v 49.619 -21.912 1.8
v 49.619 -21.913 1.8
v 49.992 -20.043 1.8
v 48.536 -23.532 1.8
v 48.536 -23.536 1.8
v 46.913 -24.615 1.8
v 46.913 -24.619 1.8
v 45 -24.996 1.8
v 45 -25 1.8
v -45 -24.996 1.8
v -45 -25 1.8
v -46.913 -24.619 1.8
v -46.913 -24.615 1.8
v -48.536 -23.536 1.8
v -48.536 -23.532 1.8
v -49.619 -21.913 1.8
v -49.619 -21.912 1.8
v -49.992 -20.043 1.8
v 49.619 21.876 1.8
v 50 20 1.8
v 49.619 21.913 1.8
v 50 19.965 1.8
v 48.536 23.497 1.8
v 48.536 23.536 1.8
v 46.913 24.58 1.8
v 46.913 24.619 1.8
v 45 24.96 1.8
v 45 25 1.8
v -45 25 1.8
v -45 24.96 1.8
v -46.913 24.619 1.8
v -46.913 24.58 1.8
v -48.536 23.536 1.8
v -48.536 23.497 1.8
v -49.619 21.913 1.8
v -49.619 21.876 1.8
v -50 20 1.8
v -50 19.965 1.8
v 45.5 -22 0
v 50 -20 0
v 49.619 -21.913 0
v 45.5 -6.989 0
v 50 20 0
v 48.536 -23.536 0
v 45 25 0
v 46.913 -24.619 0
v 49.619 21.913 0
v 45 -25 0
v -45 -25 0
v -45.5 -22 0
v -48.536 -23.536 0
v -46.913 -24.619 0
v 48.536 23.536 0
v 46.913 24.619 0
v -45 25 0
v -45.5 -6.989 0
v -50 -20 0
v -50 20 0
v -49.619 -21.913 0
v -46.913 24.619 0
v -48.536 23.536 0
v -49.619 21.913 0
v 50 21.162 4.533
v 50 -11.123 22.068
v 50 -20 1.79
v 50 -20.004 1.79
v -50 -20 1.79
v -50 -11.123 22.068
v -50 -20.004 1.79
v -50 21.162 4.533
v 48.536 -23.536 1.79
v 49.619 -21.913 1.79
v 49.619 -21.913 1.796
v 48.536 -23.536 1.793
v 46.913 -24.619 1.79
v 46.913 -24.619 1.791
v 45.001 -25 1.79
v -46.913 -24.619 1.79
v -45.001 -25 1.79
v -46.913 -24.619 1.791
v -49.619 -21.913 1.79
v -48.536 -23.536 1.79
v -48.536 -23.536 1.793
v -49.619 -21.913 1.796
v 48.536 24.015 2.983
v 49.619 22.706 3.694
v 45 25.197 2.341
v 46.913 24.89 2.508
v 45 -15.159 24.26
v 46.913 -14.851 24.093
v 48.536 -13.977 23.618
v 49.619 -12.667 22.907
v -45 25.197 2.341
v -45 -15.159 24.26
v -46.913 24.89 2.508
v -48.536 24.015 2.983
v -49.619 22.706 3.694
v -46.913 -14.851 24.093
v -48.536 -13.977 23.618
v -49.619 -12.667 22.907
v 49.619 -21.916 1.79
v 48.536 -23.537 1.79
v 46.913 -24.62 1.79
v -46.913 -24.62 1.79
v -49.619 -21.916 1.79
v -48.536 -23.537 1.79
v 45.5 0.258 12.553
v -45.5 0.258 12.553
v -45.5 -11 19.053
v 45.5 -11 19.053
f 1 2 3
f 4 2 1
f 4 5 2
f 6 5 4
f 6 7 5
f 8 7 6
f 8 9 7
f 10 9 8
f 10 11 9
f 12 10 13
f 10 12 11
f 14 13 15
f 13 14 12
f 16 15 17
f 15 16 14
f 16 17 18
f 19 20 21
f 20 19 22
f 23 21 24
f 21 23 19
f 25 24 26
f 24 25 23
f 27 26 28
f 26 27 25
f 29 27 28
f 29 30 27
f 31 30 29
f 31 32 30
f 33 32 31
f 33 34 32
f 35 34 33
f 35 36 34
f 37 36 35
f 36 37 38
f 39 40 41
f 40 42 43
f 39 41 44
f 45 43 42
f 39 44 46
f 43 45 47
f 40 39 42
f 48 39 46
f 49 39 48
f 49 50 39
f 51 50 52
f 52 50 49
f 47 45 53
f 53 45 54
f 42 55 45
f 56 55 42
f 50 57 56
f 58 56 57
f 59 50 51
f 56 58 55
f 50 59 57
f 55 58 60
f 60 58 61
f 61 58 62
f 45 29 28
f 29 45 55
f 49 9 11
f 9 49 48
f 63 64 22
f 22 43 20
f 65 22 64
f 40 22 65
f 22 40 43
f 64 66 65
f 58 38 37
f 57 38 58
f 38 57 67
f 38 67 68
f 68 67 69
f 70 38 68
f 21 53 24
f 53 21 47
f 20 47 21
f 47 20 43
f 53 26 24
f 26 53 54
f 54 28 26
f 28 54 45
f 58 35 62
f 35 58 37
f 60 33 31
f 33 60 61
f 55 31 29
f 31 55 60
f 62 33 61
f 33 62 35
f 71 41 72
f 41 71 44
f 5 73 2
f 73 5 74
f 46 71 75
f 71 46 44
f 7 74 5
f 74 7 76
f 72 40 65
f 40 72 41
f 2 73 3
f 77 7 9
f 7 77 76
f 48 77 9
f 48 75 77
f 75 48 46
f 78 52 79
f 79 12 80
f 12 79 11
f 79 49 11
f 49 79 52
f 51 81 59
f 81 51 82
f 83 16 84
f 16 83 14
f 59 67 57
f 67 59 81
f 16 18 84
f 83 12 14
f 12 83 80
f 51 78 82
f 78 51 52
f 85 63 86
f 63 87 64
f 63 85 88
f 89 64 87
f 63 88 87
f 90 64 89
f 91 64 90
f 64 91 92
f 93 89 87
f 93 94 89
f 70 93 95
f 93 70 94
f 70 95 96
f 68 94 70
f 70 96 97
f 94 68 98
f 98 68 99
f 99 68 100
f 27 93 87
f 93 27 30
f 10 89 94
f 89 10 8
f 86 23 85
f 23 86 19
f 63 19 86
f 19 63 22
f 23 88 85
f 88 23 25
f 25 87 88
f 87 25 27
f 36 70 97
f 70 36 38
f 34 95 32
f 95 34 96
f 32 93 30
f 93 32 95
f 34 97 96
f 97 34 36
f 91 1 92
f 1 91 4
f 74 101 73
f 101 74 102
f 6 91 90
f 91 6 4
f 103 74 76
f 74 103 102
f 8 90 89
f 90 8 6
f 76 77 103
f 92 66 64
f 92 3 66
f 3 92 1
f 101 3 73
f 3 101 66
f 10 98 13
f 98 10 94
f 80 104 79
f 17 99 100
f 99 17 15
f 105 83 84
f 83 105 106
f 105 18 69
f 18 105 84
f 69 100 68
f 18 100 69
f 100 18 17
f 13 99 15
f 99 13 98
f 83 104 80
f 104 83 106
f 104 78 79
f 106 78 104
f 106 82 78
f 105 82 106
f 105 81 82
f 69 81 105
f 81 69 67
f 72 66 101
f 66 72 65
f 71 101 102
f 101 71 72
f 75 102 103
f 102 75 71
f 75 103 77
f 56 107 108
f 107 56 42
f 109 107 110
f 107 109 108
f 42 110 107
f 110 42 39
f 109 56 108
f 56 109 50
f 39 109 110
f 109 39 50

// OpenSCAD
// [FL_INDEX: keywords="openscad, 3d_parametric, Customizable_Tricolor_Card_Holder, csg_solid" | COT="Parametric OpenSCAD design from 3DCodeverse"]
// Title: Customizable Tricolor Card Holder 

// preview[view:south, tilt:bottom]

/* [Color One] */

// Load a 150x40 pixel image. This is the artwork for the first colour in the logo. The background should be black and the logo white. If not, make sure to click the Invert Colors checkbox.
tone_one = "tone_one.dat"; // [image_surface:150x40]

// What Z height would you like to pause the printer to change the filament for the first logo color (mm)?
z_height_one = 0.6;

/* [Color Two] */

// Load a  150x40 pixel image. This is the artwork for the second colour in the logo. The background should be black and the logo white. If not, make sure to click the Invert Colors checkbox.
tone_two = "tone_two.dat"; // [image_surface:150x40]

// What Z height would you like to pause the printer to change the filament for the second logo color (mm)?
z_height_two = 1.2;

/* [Hidden] */

holder_x = 100;
holder_y = 50;
holder_z = 25;
card_x = 91;
card_y = 13;
card_z = 22;
corner_radius = 5;
box_x = holder_x - (corner_radius * 2);
box_y = holder_y - (corner_radius * 2);
face_z = z_height_one + z_height_two;
offset_x = (holder_x / 2) - corner_radius;
offset_y = (holder_y / 2) - corner_radius;
logo_x = 90;
logo_y = 24;
scale_x = 150;
scale_y = 40;

difference() {
	translate([0, 0, face_z]) {
		translate([0, 0, -(face_z/2)]) {
			cube([box_x, holder_y, face_z], center=true);
			cube([holder_x, box_y, face_z], center=true);
			translate([ offset_x,  offset_y, 0]) cylinder(h=face_z, r=corner_radius, center=true);
			translate([-offset_x,  offset_y, 0]) cylinder(h=face_z, r=corner_radius, center=true);
			translate([ offset_x, -offset_y, 0]) cylinder(h=face_z, r=corner_radius, center=true);
			translate([-offset_x, -offset_y, 0]) cylinder(h=face_z, r=corner_radius, center=true);
		}
		translate([0, -holder_y / 2, -0.01]) scale([1, 0.898, 1]) rotate([-26, 0, 0]) difference() {
			translate([0, holder_y / 2, holder_z/2]) {
				cube([box_x, holder_y, holder_z], center=true);
				cube([holder_x, box_y, holder_z], center=true);
				translate([ offset_x,  offset_y, 0]) cylinder(h=holder_z, r=corner_radius, center=true);
				translate([-offset_x,  offset_y, 0]) cylinder(h=holder_z, r=corner_radius, center=true);
				translate([ offset_x, -offset_y, 0]) cylinder(h=holder_z, r=corner_radius, center=true);
				translate([-offset_x, -offset_y, 0]) cylinder(h=holder_z, r=corner_radius, center=true);
			}
			rotate([26, 0, 0]) translate([0, holder_y / 2, -holder_z/2]) cube([holder_x + 1, holder_y * 4/3, holder_z], center=true);
		}
	}
	translate([0, -holder_y/2+3, 0]) rotate([-30, 0, 0]) translate([0, card_y/2, 0]) cube([card_x, card_y, card_z*2], center=true);
	translate([0, (logo_y/2)-3, -0.01]) mirror([1,0,0]) rotate([0, 0, 180]) {
		scale([(logo_x)/scale_x, (logo_y)/scale_y, z_height_one]) surface(file=tone_one, center=true, convexity=5);
		scale([(logo_x)/scale_x, (logo_y)/scale_y, z_height_two]) surface(file=tone_two, center=true, convexity=5);
	}
}
